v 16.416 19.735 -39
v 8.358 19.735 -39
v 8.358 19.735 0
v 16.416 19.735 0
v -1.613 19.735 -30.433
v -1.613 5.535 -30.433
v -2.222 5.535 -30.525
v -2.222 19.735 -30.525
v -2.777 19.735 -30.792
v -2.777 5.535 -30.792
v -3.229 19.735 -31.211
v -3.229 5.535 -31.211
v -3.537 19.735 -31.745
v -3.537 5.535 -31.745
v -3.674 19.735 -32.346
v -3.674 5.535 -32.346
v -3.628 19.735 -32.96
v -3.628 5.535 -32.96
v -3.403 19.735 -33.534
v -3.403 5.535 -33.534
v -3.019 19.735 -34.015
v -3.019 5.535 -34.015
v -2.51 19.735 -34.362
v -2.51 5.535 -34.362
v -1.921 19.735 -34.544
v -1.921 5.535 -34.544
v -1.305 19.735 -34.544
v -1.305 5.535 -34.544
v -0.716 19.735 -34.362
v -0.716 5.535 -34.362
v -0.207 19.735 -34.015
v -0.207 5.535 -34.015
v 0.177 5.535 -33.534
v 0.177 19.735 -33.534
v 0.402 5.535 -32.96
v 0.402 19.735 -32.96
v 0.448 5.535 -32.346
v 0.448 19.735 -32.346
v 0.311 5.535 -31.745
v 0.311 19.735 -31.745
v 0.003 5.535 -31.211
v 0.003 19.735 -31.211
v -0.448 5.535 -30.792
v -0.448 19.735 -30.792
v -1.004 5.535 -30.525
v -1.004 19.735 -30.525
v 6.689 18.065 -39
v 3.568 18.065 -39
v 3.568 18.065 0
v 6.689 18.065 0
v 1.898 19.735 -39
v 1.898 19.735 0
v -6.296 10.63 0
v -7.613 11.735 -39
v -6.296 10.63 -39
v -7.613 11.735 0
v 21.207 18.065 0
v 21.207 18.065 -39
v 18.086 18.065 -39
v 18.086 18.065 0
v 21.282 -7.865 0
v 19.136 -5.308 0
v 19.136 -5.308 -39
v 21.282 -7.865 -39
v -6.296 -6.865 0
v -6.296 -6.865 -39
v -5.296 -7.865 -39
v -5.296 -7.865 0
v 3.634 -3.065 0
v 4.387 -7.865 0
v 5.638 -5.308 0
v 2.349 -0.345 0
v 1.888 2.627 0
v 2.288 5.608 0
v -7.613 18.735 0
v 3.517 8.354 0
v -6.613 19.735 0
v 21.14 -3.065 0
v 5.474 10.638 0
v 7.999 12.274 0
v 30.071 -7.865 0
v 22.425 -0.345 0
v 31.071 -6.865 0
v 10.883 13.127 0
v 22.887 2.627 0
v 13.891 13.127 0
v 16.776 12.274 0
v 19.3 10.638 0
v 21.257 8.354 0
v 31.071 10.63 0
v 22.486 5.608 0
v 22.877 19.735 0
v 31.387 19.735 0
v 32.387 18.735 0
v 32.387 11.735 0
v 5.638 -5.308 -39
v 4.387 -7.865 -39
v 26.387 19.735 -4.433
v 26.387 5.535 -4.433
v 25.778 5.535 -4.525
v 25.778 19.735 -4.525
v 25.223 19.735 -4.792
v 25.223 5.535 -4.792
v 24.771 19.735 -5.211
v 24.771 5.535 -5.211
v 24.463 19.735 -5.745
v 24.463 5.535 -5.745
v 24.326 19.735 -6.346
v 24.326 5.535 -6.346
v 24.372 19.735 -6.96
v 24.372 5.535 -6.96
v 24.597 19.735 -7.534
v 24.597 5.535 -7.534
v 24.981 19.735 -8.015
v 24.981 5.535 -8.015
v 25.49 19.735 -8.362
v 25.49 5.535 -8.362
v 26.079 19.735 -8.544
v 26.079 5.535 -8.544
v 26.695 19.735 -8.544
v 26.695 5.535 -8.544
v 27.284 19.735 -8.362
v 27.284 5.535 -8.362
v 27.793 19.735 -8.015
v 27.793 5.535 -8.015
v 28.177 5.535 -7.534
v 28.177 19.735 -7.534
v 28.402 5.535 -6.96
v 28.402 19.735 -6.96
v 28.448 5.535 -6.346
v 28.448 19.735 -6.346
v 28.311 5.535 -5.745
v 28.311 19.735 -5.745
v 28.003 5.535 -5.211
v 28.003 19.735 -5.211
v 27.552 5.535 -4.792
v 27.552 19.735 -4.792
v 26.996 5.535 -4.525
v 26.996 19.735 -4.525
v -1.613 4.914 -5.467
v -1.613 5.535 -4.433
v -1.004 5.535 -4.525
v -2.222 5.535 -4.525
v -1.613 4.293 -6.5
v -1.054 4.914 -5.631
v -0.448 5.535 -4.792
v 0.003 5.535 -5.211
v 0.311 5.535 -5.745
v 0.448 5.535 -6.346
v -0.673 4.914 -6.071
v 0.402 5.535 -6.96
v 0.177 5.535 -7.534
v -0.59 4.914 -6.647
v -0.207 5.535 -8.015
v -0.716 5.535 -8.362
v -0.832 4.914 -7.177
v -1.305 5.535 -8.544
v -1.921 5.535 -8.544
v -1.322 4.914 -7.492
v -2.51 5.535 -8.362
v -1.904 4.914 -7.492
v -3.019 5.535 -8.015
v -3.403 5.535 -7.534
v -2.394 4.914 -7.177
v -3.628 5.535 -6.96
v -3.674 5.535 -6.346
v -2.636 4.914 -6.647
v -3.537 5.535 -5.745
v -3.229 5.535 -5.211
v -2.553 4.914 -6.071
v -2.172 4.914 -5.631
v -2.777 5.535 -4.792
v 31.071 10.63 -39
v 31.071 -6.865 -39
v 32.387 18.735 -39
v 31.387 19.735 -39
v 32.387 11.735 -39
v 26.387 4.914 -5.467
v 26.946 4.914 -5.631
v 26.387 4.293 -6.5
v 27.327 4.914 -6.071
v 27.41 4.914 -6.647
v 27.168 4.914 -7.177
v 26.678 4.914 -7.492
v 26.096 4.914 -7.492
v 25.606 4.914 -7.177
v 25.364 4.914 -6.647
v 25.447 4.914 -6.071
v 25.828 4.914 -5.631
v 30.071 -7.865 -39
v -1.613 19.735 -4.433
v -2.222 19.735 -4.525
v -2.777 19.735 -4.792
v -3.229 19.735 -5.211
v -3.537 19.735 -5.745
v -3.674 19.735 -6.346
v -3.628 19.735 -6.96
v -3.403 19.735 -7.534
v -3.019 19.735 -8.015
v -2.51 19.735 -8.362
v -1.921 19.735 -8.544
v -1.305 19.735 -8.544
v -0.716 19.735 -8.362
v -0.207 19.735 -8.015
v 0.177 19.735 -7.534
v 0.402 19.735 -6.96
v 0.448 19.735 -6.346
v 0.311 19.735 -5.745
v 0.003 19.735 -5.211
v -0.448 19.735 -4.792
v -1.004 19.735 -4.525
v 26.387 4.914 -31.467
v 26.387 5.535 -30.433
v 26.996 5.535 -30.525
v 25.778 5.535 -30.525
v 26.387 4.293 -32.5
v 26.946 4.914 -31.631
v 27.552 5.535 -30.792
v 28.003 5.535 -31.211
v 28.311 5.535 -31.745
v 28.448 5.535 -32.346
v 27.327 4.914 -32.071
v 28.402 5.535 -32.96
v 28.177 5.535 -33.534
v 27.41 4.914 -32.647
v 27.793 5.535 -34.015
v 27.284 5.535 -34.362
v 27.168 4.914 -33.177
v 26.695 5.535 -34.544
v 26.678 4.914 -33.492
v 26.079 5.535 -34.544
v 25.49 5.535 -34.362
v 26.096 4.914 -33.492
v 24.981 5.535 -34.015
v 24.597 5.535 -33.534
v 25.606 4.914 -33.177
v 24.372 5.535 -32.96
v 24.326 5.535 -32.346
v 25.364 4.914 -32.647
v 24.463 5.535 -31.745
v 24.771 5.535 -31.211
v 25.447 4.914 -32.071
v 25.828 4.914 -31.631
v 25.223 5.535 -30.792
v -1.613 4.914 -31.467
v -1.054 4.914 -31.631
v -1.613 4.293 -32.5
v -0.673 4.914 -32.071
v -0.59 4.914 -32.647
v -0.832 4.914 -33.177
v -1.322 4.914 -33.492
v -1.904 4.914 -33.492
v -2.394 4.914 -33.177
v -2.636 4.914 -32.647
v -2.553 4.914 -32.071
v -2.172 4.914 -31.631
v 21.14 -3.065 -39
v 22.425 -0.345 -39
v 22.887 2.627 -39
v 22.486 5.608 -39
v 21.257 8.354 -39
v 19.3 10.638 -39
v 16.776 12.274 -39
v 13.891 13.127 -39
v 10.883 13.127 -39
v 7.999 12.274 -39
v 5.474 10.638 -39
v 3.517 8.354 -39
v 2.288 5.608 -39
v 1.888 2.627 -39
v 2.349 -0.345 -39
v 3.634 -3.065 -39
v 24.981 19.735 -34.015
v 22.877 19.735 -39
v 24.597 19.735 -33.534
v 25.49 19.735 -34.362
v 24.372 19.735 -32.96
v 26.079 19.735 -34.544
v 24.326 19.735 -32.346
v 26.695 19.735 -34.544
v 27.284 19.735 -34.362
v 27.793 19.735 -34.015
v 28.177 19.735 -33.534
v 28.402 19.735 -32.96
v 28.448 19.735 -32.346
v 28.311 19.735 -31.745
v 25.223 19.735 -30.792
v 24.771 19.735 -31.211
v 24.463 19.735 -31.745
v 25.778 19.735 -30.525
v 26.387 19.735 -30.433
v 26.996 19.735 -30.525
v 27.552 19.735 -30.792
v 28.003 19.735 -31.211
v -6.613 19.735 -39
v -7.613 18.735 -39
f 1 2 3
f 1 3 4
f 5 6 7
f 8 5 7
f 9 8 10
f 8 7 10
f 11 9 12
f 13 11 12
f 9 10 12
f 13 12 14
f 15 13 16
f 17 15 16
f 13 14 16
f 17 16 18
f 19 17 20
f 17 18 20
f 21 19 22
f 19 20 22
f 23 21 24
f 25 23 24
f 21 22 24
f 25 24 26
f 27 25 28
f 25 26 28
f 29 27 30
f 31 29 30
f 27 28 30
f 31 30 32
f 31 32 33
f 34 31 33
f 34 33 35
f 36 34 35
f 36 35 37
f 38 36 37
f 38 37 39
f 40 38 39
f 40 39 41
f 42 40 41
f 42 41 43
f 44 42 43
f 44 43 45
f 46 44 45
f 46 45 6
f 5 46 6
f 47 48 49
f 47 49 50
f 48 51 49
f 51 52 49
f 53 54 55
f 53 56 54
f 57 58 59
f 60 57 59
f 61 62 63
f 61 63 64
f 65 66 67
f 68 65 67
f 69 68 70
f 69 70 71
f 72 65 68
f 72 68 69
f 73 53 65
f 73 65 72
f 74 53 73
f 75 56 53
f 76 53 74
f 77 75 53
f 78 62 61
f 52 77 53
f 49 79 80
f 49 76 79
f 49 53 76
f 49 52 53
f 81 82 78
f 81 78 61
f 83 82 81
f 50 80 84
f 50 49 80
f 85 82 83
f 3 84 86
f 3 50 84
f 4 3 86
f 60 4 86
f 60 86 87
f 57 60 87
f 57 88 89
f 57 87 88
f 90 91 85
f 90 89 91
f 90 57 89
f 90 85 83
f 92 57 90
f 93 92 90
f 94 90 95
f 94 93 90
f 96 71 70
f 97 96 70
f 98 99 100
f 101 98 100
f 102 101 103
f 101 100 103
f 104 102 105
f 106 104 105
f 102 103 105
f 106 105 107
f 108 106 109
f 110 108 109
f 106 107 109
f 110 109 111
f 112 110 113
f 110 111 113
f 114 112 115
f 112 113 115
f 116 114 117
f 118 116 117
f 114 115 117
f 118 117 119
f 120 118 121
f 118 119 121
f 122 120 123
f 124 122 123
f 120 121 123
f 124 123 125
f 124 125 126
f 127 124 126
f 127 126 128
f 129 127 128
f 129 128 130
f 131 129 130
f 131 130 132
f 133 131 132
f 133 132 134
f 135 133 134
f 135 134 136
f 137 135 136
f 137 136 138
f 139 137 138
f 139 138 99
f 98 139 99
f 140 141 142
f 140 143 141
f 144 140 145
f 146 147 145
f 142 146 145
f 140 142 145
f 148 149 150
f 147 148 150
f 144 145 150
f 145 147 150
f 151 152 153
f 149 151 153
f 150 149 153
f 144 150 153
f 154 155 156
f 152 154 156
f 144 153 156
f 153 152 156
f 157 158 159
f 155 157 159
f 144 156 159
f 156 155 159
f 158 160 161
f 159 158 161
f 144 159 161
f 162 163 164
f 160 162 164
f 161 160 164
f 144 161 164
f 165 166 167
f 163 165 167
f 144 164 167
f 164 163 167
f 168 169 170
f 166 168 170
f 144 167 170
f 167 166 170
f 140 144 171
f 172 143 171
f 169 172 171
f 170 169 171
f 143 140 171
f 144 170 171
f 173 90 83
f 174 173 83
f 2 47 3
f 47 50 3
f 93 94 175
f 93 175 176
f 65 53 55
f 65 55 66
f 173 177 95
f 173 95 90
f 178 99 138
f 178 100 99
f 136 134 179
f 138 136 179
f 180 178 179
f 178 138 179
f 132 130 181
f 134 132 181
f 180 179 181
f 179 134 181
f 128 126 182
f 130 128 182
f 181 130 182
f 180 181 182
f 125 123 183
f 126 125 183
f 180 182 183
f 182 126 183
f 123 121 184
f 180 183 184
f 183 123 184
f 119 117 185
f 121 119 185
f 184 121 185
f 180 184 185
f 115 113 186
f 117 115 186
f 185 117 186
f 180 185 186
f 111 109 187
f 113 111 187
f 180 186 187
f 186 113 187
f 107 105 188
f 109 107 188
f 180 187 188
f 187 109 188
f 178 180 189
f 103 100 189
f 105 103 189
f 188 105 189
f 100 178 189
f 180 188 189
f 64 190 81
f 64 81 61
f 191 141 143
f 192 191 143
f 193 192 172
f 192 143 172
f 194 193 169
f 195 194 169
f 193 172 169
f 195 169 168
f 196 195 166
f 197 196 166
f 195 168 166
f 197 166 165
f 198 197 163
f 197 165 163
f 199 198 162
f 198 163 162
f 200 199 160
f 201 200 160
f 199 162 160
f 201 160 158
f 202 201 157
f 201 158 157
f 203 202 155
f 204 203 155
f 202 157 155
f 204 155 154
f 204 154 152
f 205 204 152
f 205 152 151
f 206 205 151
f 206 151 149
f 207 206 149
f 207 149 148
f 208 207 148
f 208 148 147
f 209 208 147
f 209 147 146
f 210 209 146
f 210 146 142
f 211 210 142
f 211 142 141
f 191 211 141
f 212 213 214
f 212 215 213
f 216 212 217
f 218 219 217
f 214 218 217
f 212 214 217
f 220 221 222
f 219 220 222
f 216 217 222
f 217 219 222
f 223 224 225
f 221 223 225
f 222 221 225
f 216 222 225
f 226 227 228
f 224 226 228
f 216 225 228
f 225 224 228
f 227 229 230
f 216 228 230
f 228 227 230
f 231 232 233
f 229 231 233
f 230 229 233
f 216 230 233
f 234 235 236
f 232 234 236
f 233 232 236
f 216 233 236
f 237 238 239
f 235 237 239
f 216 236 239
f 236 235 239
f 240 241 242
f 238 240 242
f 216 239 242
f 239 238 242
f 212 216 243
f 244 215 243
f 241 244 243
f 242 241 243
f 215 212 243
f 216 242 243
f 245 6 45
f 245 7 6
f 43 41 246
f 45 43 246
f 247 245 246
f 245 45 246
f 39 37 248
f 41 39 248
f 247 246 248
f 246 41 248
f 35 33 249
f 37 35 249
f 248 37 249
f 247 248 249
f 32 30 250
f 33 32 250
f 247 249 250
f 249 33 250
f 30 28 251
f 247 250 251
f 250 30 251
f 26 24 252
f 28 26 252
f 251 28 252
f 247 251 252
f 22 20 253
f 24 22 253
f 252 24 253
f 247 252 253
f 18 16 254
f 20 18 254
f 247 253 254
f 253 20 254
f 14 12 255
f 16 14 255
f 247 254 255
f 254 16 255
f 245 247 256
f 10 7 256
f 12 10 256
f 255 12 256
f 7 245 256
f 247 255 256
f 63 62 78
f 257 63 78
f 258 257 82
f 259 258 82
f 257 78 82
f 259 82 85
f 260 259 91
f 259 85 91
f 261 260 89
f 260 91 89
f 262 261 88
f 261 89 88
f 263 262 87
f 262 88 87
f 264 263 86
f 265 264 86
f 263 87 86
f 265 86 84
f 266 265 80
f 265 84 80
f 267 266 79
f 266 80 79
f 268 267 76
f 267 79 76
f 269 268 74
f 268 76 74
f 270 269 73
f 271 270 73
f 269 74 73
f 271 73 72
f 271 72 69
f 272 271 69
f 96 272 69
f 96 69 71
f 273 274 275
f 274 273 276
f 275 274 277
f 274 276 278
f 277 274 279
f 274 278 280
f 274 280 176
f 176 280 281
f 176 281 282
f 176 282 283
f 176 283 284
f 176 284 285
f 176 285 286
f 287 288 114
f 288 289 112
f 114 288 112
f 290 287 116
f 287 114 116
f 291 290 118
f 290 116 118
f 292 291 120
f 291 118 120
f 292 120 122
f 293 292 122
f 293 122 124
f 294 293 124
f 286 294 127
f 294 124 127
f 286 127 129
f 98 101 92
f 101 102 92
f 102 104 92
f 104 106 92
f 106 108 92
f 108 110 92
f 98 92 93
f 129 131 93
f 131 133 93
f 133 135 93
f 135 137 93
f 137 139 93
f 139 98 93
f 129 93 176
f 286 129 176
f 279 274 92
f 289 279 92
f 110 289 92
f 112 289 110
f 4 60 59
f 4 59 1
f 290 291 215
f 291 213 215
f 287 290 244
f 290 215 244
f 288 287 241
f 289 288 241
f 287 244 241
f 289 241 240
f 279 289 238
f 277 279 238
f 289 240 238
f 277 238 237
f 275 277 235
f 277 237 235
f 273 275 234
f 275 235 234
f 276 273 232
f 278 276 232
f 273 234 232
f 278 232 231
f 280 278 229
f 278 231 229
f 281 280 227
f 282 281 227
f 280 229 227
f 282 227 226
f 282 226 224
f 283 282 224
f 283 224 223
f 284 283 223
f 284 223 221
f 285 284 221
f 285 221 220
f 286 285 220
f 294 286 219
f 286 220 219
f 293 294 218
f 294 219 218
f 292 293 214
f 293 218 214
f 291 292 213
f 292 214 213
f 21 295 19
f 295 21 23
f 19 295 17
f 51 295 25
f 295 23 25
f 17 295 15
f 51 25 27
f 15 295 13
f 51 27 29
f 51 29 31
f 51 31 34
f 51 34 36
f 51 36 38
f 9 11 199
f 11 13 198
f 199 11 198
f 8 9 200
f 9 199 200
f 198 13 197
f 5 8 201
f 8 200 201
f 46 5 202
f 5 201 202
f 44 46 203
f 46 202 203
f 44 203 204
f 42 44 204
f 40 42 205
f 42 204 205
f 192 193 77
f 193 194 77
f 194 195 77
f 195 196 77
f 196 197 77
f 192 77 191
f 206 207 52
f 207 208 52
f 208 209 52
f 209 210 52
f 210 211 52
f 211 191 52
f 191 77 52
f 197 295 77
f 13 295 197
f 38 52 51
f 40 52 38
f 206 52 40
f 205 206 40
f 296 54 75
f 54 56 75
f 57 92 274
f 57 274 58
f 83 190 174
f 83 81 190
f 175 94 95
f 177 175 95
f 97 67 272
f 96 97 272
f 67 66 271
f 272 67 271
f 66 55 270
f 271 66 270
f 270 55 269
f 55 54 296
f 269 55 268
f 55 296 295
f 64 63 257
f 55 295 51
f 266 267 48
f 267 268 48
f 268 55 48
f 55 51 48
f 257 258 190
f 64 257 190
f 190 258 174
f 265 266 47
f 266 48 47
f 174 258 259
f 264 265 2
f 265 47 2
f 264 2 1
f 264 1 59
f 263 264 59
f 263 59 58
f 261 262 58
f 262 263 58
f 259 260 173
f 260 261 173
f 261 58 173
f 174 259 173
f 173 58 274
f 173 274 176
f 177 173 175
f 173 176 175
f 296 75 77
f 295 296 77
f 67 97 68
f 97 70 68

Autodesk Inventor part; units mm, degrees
ref_plane "YZ Plane" through (0, 0, 0) normal (1, 0, 0) x (0, 1, 0)
ref_plane "XZ Plane" through (0, 0, 0) normal (0, 1, 0) x (-1, 0, 0)
ref_plane "XY Plane" through (0, 0, 0) normal (0, 0, 1) x (1, 0, 0)
sketch "Esboço1" plane through (0, 0, 0) normal (0, 0, 1) x (1, 0, 0)
  arc A0 (19.1365, -5.3084) -> (5.6379, -5.3084) centre (12.3872, 2.735) ccw
  line L0 (12.3872, 2.735) -> (12.3872, 19.735) construction
  line L1 (32.3872, 18.735) -> (32.3872, 11.735)
  line L2 (-7.6128, 11.735) -> (-7.6128, 18.735)
  circle A1 centre (12.3872, 2.735) radius 4.25 construction
  line L3 (30.0707, -7.865) -> (21.2817, -7.865)
  line L4 (4.3872, -7.865) -> (-5.2963, -7.865)
  line L5 (5.6379, -5.3084) -> (4.3872, -7.865)
  line L6 (19.1365, -5.3084) -> (21.2817, -7.865)
  line L7 (-7.6128, 11.735) -> (-6.2963, 10.6304)
  line L8 (-6.2963, 10.6304) -> (-6.2963, -6.865)
  line L9 (-1.6128, -7.865) -> (-1.6128, 19.735) construction
  line L10 (26.3872, -7.865) -> (26.3872, 19.735) construction
  line L11 (12.3872, 19.735) -> (12.3872, -10.9717) construction
  line L12 (32.3872, 11.735) -> (31.0707, 10.6304)
  line L13 (31.0707, 10.6304) -> (31.0707, -6.865)
  line L14 (1.3434, 19.735) -> (5.648, 19.735) construction
  line L15 (1.8977, 19.735) -> (3.5675, 18.0653)
  line L16 (0.2217, 19.735) -> (2.5831, 19.735) construction
  line L17 (3.5675, 18.0653) -> (6.6886, 18.0653)
  line L18 (6.6886, 18.0653) -> (8.3584, 19.735)
  line L19 (22.8767, 19.735) -> (21.2069, 18.0653)
  line L20 (21.2069, 18.0653) -> (18.0858, 18.0653)
  line L21 (18.0858, 18.0653) -> (16.416, 19.735)
  line L22 (-6.6128, 19.735) -> (1.8977, 19.735)
  line L23 (8.3584, 19.735) -> (16.416, 19.735)
  line L24 (22.8767, 19.735) -> (31.3872, 19.735)
  line L25 (-7.6128, 18.735) -> (-6.6128, 19.735)
  line L26 (-6.2963, -6.865) -> (-5.2963, -7.865)
  line L27 (30.0707, -7.865) -> (31.0707, -6.865)
  line L28 (32.3872, 18.735) -> (31.3872, 19.735)
  point P0 (0, 0)
  point P1 (-7.6128, 19.735)
  point P2 (32.3872, 19.735)
  point P3 (-6.2963, -7.865)
  point P4 (31.0707, -7.865)
  dimension "d0" = 17
  dimension "d2" = 40
  dimension "d4" = 8.5
  dimension "d6" = 20
  dimension "d10" = 8
  dimension "d12" = 14
  dimension "d13" = 14
  dimension "d19" = 1
  dimension "d20" = 1
  dimension "d21" = 1
  dimension "d22" = 1
  dimension "d23" = 1
  dimension "d24" = 1
  dimension "d25" = 1
  dimension "d26" = 1
extrude "Extrusão1" add sketch "Esboço1" against normal blind 39
sketch "Esboço2" plane through (-6.6128, 19.735, 0) normal (0, 1, 0) x (1, 0, 0)
  line L0 (-1, 0) -> (0.3165, 0)
  line L1 (39, 0) -> (39, 39)
  line L2 (-1, 0) -> (39, 0)
  line L3 (39, 0) -> (39, 39)
  line L4 (39, 39) -> (-1, 39)
  line L5 (-1, 0) -> (-1, 39)
  line L6 (-1, 39) -> (-1, 0)
  line L7 (8.5105, 0) -> (0, 0)
  line L8 (11, 39) -> (1.3165, 39)
  line L9 (27.8945, 0) -> (36.6835, 0)
  line L10 (33, 0) -> (33, 39) construction
  line L11 (29.5, 0) -> (8.5, 0)
  line L12 (19, 0) -> (19, 39) construction
  line L13 (8.5, 39) -> (29.5, 39)
  line L14 (11, 39) -> (1.3165, 39) projected
  line L15 (5, 39) -> (5, 0) construction
  line L16 (1.3165, 0) -> (11, 0) projected
  line L17 (-4.598, 19.5) -> (42.402, 19.5) construction
  line L18 (-10.187, 32.5) -> (53.6518, 32.5) construction
  line L19 (-10.187, 6.5) -> (53.6518, 6.5) construction
  circle A0 centre (5, 32.5) radius 1.6801 construction
  circle A1 centre (33, 32.5) radius 1.5751 construction
  circle A2 centre (5, 6.5) radius 1.6801 construction
  circle A3 centre (33, 6.5) radius 1.5751 construction
  point P0 (6.6128, 0)
  point P1 (12.2507, 0)
  point P2 (25.7493, 0)
  point P3 (25.7493, 39)
  point P4 (12.2507, 39)
  dimension "d29" = 14
  dimension "d31" = 14
  dimension "d32" = 47
  dimension "d33" = 13
  dimension "d34" = 13
hole "Furo1" at (-1.6128, 19.735, -32.5) at (26.3872, 19.735, -32.5) at (26.3872, 19.735, -6.5) at (-1.6128, 19.735, -6.5) direction (0, -1, 0) diameter 4.134 depth 14.2 tip angle 118 thread size "M5x0.8" class "6H" standard "ANSI Metric M Profile"
equation "\"d20\" = d19"
equation "\"d21\" = d19"
equation "\"d22\" = d21"
equation "\"d23\" = d19"
equation "\"d24\" = d23"
equation "\"d25\" = d19"
equation "\"d26\" = d25"
properties part number "PilowBlockAberto"
